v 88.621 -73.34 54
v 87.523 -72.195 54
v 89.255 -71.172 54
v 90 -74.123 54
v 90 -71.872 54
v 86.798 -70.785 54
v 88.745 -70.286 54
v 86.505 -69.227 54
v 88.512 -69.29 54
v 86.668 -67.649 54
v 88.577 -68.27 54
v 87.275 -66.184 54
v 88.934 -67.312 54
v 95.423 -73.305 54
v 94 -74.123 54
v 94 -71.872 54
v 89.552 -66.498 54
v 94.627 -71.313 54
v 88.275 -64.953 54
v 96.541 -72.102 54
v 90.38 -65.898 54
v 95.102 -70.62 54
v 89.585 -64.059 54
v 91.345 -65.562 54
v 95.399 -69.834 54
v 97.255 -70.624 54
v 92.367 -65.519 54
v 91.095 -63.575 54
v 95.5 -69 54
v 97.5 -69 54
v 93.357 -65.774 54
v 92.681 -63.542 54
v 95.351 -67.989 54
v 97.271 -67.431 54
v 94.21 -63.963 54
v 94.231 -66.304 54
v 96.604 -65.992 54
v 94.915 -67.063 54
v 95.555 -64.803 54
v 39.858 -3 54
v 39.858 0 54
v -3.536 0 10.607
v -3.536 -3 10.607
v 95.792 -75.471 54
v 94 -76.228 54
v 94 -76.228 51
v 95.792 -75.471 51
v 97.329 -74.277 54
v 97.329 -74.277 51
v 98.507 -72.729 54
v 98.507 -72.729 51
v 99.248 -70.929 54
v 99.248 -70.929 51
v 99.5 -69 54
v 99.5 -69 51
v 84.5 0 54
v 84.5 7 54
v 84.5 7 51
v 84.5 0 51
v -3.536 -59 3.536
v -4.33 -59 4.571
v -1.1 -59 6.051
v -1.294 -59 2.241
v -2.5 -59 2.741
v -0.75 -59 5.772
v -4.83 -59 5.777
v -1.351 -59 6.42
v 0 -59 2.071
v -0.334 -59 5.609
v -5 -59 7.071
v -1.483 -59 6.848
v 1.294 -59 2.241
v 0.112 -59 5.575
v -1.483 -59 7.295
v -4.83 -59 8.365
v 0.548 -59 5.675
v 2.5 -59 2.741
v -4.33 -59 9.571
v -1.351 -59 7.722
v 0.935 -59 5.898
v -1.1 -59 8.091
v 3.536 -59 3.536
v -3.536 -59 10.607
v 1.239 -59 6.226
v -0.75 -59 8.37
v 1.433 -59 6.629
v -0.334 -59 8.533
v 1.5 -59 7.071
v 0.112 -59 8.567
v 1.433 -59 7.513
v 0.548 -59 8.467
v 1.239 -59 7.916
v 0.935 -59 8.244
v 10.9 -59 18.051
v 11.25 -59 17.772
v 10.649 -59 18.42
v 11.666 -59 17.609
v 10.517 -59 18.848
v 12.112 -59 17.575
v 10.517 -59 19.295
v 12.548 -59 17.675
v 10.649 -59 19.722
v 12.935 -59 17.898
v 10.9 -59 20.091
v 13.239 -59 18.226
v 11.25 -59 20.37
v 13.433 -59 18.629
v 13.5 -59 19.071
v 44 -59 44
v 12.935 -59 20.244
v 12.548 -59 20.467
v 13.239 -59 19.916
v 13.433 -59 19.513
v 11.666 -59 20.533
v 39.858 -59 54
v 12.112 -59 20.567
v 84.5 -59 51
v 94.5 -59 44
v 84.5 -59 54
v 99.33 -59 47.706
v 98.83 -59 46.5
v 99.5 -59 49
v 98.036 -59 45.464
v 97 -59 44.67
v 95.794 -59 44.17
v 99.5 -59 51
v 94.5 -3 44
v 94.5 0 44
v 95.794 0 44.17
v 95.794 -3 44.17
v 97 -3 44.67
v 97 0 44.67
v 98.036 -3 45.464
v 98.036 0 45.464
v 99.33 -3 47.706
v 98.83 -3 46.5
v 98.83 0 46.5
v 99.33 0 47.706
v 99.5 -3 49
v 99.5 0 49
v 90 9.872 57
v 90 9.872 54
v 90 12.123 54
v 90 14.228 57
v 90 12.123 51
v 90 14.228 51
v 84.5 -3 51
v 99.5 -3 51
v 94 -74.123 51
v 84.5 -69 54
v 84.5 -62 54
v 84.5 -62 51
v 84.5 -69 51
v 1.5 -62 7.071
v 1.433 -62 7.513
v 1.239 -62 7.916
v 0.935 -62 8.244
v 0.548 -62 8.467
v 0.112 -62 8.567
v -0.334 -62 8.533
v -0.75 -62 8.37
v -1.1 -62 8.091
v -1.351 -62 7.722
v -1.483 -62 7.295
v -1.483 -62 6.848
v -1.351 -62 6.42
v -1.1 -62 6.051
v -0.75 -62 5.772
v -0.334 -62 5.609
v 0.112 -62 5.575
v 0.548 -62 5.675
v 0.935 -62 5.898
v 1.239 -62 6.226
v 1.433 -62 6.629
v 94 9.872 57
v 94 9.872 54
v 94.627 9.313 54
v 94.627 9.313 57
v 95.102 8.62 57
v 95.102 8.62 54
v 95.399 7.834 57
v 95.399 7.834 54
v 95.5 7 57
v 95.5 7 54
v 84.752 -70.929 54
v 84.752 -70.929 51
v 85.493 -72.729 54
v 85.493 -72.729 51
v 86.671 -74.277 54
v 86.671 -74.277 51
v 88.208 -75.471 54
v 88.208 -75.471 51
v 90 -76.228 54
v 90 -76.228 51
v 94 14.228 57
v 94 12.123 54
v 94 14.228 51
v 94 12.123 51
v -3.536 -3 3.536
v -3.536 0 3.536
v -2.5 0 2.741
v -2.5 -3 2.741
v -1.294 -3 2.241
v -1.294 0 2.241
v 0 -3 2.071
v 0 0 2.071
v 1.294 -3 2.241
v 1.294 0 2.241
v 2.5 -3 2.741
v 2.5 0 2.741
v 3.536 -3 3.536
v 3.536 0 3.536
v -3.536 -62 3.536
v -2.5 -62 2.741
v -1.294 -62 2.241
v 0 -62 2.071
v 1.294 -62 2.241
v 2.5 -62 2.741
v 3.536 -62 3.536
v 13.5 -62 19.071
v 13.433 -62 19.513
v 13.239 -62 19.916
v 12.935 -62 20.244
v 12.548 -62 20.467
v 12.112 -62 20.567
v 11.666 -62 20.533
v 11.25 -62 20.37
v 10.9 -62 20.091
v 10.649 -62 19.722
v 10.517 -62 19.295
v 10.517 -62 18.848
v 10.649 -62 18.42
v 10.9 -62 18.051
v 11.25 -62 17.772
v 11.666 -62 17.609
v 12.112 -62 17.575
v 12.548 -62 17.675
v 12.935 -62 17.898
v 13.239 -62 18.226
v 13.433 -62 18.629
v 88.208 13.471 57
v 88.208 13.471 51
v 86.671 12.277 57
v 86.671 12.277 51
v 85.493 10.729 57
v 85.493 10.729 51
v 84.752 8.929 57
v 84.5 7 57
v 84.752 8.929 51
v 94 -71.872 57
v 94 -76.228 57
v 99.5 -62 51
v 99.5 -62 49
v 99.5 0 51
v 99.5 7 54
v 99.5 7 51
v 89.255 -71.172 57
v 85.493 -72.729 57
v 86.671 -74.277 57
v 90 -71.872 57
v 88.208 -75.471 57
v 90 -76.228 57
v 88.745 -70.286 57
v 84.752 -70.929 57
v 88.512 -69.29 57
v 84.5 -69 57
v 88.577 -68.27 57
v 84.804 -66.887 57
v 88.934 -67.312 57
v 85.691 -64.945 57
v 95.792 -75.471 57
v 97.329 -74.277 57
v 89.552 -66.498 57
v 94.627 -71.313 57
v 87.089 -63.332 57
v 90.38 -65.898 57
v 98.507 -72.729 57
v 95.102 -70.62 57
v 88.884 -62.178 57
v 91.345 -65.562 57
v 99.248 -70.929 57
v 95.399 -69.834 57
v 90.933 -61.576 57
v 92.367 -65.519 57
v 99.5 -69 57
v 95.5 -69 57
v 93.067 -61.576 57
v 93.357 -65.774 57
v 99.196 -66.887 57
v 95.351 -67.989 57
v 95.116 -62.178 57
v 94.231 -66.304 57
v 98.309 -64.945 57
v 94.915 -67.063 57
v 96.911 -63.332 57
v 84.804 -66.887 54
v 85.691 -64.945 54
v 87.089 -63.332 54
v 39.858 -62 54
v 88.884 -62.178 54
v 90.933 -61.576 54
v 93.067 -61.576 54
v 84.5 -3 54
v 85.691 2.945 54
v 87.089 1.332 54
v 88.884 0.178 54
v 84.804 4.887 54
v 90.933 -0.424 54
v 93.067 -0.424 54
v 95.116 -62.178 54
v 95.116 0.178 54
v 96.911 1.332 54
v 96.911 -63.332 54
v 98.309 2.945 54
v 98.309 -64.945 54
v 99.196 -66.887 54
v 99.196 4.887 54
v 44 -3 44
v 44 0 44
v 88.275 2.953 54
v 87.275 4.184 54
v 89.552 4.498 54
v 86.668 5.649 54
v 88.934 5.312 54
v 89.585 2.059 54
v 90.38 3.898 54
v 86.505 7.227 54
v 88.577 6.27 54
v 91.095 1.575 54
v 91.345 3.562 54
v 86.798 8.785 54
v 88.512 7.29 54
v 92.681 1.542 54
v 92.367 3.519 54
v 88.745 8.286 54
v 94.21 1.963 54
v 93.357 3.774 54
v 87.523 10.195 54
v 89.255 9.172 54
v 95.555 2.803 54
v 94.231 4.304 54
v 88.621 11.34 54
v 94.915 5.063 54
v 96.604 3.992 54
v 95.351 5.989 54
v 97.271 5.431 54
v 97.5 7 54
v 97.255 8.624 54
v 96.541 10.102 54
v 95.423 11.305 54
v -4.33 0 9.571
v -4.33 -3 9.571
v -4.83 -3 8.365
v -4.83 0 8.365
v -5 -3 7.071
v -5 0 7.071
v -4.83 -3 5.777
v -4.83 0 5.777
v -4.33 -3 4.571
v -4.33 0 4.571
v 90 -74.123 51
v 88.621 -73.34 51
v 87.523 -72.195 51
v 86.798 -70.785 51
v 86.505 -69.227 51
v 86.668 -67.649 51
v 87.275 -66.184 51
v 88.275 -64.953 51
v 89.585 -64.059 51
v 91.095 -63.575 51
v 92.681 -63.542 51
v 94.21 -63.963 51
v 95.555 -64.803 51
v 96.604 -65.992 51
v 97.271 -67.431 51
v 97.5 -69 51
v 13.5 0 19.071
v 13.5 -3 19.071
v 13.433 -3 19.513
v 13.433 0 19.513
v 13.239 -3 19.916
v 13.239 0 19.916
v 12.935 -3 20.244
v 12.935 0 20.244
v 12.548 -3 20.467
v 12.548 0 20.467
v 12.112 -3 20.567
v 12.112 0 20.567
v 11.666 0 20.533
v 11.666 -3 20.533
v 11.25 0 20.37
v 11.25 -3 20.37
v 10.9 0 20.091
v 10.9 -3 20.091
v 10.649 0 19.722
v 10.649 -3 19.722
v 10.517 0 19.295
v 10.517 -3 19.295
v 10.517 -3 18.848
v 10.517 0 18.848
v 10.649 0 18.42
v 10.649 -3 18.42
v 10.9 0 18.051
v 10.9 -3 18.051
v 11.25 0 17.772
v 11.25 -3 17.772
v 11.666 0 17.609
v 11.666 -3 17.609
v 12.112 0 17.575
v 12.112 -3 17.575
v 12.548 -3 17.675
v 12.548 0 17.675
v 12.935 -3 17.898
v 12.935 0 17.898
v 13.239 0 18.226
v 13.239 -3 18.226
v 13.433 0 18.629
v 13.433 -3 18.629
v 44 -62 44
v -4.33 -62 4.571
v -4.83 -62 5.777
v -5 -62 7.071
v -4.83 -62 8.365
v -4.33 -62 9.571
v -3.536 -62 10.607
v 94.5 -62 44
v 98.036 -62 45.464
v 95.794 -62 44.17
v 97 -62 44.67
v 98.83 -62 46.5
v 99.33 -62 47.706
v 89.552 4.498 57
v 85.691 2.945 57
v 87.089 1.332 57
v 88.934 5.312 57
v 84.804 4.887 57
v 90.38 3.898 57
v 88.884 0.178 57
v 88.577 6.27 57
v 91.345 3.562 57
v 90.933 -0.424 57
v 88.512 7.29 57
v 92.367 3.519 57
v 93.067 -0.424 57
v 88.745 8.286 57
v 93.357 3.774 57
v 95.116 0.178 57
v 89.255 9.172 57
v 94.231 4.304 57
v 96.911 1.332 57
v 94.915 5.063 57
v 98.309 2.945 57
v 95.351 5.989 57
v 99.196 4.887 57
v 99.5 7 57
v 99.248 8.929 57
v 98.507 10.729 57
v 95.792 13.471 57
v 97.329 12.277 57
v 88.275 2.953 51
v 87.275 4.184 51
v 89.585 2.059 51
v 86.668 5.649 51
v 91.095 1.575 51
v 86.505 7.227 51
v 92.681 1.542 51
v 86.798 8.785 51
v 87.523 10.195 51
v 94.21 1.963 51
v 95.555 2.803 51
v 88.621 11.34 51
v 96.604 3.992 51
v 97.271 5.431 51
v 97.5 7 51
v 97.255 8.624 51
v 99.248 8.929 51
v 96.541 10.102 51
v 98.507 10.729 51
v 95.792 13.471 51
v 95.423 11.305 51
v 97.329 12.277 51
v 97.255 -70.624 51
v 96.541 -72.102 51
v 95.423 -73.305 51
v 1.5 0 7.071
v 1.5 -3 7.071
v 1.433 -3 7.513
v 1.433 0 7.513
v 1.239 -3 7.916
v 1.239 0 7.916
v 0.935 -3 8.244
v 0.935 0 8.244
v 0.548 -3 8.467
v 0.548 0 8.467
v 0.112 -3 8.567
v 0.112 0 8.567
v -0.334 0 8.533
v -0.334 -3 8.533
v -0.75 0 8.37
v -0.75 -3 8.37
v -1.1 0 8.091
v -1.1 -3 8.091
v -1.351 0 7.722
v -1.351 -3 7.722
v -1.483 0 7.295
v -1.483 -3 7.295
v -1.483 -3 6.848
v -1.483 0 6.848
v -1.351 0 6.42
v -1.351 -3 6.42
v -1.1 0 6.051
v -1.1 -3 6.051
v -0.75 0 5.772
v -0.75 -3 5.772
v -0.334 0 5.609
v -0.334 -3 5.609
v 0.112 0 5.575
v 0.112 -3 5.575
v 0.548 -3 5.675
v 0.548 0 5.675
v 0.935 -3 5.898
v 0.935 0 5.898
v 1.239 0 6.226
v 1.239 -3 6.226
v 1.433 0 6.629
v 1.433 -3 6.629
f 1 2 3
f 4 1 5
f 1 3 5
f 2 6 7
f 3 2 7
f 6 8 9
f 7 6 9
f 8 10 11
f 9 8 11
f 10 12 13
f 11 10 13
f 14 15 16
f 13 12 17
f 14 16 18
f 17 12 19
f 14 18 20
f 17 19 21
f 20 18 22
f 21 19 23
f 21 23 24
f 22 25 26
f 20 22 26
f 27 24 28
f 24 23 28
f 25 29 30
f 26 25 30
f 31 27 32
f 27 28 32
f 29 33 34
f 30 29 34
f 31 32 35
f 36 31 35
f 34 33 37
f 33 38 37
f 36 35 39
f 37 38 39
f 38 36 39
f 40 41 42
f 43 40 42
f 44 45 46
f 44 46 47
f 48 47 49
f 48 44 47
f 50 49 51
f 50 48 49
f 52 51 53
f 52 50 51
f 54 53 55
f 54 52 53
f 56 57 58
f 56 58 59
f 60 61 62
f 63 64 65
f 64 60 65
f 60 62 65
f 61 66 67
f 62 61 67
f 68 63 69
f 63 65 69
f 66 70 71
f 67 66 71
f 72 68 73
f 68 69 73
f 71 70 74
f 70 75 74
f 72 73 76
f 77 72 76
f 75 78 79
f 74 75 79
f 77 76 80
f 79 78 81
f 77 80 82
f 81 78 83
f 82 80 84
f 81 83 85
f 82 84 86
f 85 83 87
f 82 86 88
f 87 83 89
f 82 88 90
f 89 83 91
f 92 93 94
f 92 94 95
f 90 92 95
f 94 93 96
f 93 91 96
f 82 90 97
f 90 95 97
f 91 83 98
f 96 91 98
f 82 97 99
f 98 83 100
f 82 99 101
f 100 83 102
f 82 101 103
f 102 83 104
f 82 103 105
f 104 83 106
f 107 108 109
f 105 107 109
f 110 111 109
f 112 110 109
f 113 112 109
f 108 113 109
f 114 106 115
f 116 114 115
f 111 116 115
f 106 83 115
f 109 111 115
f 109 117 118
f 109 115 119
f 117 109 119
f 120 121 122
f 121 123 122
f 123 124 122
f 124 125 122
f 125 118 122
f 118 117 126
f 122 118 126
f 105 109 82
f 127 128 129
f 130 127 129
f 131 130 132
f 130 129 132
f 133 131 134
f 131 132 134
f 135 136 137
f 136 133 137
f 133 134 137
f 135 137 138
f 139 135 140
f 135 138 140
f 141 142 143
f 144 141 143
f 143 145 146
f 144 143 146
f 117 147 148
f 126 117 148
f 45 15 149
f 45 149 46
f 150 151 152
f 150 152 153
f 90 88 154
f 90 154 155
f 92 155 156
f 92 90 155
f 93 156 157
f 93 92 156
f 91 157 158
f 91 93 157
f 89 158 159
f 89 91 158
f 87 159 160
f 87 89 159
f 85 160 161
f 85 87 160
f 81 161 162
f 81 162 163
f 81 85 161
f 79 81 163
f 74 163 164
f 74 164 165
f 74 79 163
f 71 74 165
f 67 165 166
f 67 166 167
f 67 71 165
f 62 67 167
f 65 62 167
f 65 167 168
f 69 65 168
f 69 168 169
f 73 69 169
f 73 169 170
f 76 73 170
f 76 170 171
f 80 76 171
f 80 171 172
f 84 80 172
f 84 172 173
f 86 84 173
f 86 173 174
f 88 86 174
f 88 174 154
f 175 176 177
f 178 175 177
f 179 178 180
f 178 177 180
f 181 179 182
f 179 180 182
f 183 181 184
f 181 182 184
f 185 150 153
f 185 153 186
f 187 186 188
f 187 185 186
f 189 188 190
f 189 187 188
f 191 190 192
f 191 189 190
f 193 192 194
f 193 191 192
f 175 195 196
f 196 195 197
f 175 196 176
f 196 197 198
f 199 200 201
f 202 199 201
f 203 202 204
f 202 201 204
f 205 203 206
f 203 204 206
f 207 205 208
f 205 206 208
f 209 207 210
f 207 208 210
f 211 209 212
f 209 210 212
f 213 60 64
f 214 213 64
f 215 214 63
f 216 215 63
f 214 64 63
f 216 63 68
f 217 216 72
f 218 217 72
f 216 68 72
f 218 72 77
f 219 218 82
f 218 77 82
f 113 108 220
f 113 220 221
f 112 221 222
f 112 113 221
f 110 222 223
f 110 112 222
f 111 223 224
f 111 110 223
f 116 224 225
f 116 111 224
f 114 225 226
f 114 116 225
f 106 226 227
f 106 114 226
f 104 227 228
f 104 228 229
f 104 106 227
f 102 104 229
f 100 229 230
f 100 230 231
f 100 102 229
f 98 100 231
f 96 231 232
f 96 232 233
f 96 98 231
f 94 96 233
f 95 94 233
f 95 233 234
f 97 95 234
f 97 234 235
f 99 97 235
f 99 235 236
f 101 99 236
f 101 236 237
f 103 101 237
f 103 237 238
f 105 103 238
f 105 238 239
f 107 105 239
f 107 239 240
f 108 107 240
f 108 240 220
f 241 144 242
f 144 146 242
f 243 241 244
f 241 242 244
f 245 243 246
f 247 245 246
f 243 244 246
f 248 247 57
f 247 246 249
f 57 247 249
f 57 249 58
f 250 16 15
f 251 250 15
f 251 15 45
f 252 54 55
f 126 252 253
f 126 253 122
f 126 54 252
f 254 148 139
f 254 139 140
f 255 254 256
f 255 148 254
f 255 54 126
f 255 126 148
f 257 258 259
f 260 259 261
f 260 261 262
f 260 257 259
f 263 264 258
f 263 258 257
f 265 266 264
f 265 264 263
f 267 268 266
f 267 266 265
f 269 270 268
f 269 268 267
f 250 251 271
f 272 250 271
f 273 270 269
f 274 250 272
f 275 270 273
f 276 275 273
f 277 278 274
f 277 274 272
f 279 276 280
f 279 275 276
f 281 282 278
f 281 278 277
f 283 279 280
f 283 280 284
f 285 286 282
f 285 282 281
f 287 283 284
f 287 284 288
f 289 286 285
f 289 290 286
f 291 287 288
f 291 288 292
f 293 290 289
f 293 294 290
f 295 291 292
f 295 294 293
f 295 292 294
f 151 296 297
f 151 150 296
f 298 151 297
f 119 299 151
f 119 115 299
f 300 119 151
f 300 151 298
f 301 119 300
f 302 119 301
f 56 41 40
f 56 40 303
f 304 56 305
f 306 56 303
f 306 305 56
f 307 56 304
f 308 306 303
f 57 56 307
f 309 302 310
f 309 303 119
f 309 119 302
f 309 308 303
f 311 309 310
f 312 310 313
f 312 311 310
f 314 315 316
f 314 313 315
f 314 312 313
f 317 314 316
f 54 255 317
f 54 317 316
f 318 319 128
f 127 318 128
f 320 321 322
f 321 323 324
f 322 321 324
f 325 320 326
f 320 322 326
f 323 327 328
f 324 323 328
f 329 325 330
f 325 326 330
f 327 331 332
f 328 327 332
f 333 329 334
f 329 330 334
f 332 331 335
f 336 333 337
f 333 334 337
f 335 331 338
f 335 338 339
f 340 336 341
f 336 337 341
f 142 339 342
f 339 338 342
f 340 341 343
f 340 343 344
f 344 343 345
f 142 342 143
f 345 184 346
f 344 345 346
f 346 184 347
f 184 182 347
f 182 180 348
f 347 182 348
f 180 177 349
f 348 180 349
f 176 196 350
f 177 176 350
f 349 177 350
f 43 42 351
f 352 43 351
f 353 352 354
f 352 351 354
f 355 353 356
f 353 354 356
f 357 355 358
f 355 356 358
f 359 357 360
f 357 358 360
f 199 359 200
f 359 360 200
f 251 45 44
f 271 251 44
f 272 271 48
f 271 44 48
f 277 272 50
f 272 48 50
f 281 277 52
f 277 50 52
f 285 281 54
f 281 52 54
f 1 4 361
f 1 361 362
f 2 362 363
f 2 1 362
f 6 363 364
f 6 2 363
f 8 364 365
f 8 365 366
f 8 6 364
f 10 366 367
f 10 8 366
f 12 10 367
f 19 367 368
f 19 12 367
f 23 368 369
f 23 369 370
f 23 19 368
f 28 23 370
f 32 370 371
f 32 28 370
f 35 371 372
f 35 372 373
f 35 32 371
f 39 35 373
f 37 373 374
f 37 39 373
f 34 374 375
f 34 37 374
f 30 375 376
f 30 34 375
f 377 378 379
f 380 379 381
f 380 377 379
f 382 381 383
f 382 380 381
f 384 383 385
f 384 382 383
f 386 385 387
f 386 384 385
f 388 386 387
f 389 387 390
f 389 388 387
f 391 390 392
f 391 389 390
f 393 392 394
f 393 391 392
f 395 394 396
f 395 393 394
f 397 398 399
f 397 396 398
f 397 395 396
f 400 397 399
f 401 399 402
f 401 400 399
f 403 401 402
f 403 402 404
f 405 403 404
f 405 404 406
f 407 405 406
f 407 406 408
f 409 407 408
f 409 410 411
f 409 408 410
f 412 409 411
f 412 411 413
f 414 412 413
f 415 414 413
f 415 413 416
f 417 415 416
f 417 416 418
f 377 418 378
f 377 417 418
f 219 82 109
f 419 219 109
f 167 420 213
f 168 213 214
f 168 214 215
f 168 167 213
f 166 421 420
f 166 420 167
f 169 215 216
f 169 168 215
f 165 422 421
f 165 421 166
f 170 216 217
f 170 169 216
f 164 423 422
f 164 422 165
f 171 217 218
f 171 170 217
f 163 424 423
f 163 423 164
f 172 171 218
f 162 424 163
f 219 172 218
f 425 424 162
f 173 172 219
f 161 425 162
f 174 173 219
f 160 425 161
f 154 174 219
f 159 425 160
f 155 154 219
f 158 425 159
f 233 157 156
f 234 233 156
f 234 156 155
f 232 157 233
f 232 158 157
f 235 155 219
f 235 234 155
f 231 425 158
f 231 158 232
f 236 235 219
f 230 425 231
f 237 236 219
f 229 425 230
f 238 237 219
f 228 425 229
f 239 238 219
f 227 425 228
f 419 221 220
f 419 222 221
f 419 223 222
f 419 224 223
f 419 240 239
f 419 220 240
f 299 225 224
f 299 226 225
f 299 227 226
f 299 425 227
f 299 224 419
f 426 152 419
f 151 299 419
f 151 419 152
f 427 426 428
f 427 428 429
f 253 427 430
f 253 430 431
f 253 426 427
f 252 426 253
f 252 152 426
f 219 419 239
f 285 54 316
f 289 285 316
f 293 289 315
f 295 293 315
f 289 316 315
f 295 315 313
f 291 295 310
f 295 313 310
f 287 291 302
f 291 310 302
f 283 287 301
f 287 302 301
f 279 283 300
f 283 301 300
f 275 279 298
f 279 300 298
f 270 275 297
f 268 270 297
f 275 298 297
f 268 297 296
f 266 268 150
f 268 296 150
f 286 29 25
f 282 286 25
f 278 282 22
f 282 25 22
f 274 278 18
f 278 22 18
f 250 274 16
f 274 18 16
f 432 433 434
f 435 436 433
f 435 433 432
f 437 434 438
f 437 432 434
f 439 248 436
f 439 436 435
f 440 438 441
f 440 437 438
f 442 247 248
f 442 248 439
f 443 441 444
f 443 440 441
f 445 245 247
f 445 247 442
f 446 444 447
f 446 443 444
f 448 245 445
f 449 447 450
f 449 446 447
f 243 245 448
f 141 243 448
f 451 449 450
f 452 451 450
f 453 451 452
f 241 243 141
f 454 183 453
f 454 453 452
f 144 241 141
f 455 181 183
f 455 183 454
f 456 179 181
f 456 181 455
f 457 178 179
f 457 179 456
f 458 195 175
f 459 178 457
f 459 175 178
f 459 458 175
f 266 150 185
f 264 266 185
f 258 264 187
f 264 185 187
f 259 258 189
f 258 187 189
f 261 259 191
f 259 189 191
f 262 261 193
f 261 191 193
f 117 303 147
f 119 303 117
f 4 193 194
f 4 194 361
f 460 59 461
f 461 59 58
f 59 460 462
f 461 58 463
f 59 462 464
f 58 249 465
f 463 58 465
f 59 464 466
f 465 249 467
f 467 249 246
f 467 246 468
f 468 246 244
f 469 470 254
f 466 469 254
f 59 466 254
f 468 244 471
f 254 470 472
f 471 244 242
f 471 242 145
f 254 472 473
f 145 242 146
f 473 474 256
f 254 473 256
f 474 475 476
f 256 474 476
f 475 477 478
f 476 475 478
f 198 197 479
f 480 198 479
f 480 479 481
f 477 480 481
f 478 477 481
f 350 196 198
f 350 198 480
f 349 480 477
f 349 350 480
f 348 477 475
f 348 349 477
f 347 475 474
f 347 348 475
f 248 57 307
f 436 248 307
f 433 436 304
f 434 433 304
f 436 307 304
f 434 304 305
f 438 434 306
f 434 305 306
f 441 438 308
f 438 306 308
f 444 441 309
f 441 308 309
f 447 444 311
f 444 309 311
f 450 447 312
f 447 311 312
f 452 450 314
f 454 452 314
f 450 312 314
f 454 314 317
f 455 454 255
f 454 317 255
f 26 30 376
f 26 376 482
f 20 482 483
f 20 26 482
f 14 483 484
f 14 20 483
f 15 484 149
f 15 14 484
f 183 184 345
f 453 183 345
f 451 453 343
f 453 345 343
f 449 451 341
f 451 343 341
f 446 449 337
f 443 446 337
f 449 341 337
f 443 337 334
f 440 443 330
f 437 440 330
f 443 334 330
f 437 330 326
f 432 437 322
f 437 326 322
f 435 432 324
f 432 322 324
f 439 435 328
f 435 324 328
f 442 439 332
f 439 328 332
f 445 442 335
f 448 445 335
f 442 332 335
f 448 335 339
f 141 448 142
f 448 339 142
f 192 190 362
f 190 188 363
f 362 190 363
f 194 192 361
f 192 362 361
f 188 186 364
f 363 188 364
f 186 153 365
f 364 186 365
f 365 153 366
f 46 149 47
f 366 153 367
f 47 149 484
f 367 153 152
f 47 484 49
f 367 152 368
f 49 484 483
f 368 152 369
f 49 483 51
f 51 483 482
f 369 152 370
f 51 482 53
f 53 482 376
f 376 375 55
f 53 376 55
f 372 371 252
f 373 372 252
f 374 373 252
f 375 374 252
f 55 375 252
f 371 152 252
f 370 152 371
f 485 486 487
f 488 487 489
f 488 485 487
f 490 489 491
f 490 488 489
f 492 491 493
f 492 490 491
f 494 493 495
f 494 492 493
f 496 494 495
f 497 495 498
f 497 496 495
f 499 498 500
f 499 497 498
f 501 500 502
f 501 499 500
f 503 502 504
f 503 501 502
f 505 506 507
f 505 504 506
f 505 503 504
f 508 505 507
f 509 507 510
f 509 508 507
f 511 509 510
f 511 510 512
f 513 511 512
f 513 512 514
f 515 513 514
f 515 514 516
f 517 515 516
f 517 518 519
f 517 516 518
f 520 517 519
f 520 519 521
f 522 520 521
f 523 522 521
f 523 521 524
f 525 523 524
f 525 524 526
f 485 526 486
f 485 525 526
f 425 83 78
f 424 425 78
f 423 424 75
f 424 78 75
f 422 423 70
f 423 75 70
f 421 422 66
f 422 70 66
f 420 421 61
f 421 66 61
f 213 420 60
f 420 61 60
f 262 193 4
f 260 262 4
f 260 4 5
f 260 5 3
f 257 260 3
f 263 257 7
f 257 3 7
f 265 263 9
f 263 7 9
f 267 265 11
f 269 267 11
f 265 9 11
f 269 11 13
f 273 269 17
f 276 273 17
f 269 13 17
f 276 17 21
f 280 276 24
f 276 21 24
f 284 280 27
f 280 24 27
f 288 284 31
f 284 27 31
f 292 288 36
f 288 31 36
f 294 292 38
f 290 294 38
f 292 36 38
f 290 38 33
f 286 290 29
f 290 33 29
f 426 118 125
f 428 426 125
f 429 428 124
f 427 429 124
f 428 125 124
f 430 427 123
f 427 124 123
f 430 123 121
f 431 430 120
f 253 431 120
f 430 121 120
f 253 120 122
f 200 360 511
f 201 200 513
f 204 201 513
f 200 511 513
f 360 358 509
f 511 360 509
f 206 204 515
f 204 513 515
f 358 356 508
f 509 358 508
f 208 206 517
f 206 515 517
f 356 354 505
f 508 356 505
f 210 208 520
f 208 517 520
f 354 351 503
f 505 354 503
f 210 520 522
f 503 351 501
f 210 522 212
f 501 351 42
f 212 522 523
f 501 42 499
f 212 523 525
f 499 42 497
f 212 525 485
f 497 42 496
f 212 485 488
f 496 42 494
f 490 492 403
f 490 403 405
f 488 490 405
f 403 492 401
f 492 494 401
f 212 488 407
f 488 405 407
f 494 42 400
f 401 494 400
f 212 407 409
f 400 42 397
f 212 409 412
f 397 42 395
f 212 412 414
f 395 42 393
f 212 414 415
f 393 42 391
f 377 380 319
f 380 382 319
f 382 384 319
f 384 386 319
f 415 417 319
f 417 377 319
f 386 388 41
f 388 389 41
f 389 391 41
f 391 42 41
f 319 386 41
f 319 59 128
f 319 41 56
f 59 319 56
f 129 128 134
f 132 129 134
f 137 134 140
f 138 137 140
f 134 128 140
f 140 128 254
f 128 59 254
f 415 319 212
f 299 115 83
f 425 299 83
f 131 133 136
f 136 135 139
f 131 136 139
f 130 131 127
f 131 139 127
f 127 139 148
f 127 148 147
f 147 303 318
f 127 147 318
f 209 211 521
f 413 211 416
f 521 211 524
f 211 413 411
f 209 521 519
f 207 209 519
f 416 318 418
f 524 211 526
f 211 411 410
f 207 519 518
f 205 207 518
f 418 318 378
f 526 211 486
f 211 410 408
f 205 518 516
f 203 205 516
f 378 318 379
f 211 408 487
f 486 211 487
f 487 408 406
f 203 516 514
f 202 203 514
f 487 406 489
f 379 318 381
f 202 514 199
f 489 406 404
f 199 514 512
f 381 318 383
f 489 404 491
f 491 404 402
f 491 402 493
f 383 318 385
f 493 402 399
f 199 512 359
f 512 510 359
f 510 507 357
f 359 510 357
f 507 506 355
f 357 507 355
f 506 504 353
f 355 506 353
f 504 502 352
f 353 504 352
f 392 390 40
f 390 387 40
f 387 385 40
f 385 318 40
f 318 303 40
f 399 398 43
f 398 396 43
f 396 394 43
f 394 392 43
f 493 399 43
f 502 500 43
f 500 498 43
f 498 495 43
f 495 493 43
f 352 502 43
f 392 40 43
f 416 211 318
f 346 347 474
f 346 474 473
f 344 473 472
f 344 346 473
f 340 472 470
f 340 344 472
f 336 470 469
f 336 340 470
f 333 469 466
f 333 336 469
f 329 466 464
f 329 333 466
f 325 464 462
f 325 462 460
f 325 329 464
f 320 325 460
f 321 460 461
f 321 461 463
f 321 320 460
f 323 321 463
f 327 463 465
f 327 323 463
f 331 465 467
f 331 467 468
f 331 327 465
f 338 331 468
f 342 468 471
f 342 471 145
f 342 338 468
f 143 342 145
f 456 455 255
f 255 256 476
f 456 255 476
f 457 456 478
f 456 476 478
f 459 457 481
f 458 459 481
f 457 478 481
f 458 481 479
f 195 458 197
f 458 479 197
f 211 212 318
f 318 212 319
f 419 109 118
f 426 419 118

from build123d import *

# Parameters (mm, degrees)
F0_R     = 1.5
F1_DEPTH = 62
F2_W     = 60.3578643763
F2_H     = 56
F2_W_2   = 59.6421356237
F3_DEPTH = 100
F5_DEPTH = 3
F8_DEPTH = 3


with BuildPart() as f1:
    # F0 (on Front) → F1 (new body)
    with BuildSketch(Plane.XZ):
        with BuildLine():
            ThreePointArc((-3.5355339059, 3.5355339059), (0, 2.0710678119), (3.5355339059, 3.5355339059))
            Line((3.5355339059, 3.5355339059), (44, 44))
            Line((44, 44), (94.5, 44))
            ThreePointArc((94.5, 44), (98.0355339059, 45.4644660941), (99.5, 49))
            Line((99.5, 49), (99.5, 54))
            Line((99.5, 54), (39.8578643763, 54))
            Line((39.8578643763, 54), (-3.5355339059, 10.6066017178))
            ThreePointArc((-3.5355339059, 10.6066017178), (-5, 7.0710678119), (-3.5355339059, 3.5355339059))
        make_face()
        with Locations((0, 7.0710678119)):
            Circle(F0_R, mode=Mode.SUBTRACT)
        with Locations((12, 19.0710678119)):
            Circle(F0_R, mode=Mode.SUBTRACT)
    extrude(amount=F1_DEPTH)

    # F2 (on face) → F3 (cut)
    with BuildSketch(Plane.XY.offset(54)):
        with Locations((9.6789321881, -31)):
            Rectangle(F2_W, F2_H)
        with Locations((69.6789321881, -31)):
            Rectangle(F2_W_2, F2_H)
    extrude(amount=-F3_DEPTH, mode=Mode.SUBTRACT)


with BuildPart() as f5:
    # F4 (on face) → F5 (new body)
    with BuildSketch(Plane.XY.offset(54)):
        with BuildLine():
            ThreePointArc((99.5, -69), (92, -61.5), (84.5, -69))
            ThreePointArc((84.5, -69), (86.0313318068, -73.5414755311), (90, -76.2284161474))
            Line((90, -76.2284161474), (90, -74.123475383))
            ThreePointArc((90, -74.123475383), (88.8975815885, -64.4585244689), (97.5, -69))
            ThreePointArc((97.5, -69), (96.5414755311, -72.1024184115), (94, -74.123475383))
            Line((94, -74.123475383), (94, -76.2284161474))
            ThreePointArc((94, -76.2284161474), (97.9686681932, -73.5414755311), (99.5, -69))
        make_face()
        with BuildLine():
            ThreePointArc((89.3074175964, 0), (85.8175907598, 2.7540824329), (84.5, 7))
            Line((84.5, 7), (84.5, 0))
            Line((84.5, 0), (89.3074175964, 0))
        make_face()
        with BuildLine():
            Line((99.5, -3), (84.5, -3))
            Line((84.5, -3), (84.5, -69))
            ThreePointArc((84.5, -69), (92, -61.5), (99.5, -69))
            Line((99.5, -69), (99.5, -3))
        make_face()
        with BuildLine():
            ThreePointArc((99.5, 7), (98.1824092402, 2.7540824329), (94.6925824036, 0))
            Line((94.6925824036, 0), (99.5, 0))
            Line((99.5, 0), (99.5, 7))
        make_face()
        with BuildLine():
            Line((94.6925824036, 0), (89.3074175964, 0))
            ThreePointArc((89.3074175964, 0), (92, -0.5), (94.6925824036, 0))
        make_face()
        with BuildLine():
            ThreePointArc((90, 14.2284161474), (86.0313318068, 11.5414755311), (84.5, 7))
            ThreePointArc((84.5, 7), (85.8175907598, 2.7540824329), (89.3074175964, 0))
            Line((89.3074175964, 0), (94.6925824036, 0))
            ThreePointArc((94.6925824036, 0), (98.1824092402, 2.7540824329), (99.5, 7))
            ThreePointArc((99.5, 7), (97.9686681932, 11.5414755311), (94, 14.2284161474))
            Line((94, 14.2284161474), (94, 12.123475383))
            ThreePointArc((94, 12.123475383), (96.5414755311, 10.1024184115), (97.5, 7))
            ThreePointArc((97.5, 7), (88.8975815885, 2.4585244689), (90, 12.123475383))
            Line((90, 12.123475383), (90, 14.2284161474))
        make_face()
        with BuildLine():
            Line((89.3074175964, 0), (84.5, 0))
            Line((84.5, 0), (84.5, -3))
            Line((84.5, -3), (99.5, -3))
            Line((99.5, -3), (99.5, 0))
            Line((99.5, 0), (94.6925824036, 0))
            ThreePointArc((94.6925824036, 0), (92, -0.5), (89.3074175964, 0))
        make_face()
    extrude(amount=-F5_DEPTH)


with BuildPart() as f1_1:
    add(f1.part)

    # F6: union F5
    add(f5.part)

    # F7 (on face) → F8 (join)
    with BuildSketch(Plane.XY.offset(54)):
        with BuildLine():
            ThreePointArc((90, 12.123475383), (92, 1.5), (94, 12.123475383))
            Line((94, 12.123475383), (94, 9.8722813233))
            ThreePointArc((94, 9.8722813233), (95.1024184115, 8.6201851746), (95.5, 7))
            ThreePointArc((95.5, 7), (90.3798148254, 3.8975815885), (90, 9.8722813233))
            Line((90, 9.8722813233), (90, 12.123475383))
        make_face()
        with BuildLine():
            ThreePointArc((84.5, 7), (92, -0.5), (99.5, 7))
            ThreePointArc((99.5, 7), (97.9686681932, 11.5414755311), (94, 14.2284161474))
            Line((94, 14.2284161474), (94, 12.123475383))
            ThreePointArc((94, 12.123475383), (92, 1.5), (90, 12.123475383))
            Line((90, 12.123475383), (90, 14.2284161474))
            ThreePointArc((90, 14.2284161474), (86.0313318068, 11.5414755311), (84.5, 7))
        make_face()
        with BuildLine():
            Line((94, -71.8722813233), (94, -74.123475383))
            ThreePointArc((94, -74.123475383), (92, -63.5), (90, -74.123475383))
            Line((90, -74.123475383), (90, -71.8722813233))
            ThreePointArc((90, -71.8722813233), (90.3798148254, -65.8975815885), (95.5, -69))
            ThreePointArc((95.5, -69), (95.1024184115, -70.6201851746), (94, -71.8722813233))
        make_face()
        with BuildLine():
            ThreePointArc((94, -76.2284161474), (97.9686681932, -73.5414755311), (99.5, -69))
            ThreePointArc((99.5, -69), (92, -61.5), (84.5, -69))
            ThreePointArc((84.5, -69), (86.0313318068, -73.5414755311), (90, -76.2284161474))
            Line((90, -76.2284161474), (90, -74.123475383))
            ThreePointArc((90, -74.123475383), (92, -63.5), (94, -74.123475383))
            Line((94, -74.123475383), (94, -76.2284161474))
        make_face()
    extrude(amount=F8_DEPTH)


solid = f1_1.part
